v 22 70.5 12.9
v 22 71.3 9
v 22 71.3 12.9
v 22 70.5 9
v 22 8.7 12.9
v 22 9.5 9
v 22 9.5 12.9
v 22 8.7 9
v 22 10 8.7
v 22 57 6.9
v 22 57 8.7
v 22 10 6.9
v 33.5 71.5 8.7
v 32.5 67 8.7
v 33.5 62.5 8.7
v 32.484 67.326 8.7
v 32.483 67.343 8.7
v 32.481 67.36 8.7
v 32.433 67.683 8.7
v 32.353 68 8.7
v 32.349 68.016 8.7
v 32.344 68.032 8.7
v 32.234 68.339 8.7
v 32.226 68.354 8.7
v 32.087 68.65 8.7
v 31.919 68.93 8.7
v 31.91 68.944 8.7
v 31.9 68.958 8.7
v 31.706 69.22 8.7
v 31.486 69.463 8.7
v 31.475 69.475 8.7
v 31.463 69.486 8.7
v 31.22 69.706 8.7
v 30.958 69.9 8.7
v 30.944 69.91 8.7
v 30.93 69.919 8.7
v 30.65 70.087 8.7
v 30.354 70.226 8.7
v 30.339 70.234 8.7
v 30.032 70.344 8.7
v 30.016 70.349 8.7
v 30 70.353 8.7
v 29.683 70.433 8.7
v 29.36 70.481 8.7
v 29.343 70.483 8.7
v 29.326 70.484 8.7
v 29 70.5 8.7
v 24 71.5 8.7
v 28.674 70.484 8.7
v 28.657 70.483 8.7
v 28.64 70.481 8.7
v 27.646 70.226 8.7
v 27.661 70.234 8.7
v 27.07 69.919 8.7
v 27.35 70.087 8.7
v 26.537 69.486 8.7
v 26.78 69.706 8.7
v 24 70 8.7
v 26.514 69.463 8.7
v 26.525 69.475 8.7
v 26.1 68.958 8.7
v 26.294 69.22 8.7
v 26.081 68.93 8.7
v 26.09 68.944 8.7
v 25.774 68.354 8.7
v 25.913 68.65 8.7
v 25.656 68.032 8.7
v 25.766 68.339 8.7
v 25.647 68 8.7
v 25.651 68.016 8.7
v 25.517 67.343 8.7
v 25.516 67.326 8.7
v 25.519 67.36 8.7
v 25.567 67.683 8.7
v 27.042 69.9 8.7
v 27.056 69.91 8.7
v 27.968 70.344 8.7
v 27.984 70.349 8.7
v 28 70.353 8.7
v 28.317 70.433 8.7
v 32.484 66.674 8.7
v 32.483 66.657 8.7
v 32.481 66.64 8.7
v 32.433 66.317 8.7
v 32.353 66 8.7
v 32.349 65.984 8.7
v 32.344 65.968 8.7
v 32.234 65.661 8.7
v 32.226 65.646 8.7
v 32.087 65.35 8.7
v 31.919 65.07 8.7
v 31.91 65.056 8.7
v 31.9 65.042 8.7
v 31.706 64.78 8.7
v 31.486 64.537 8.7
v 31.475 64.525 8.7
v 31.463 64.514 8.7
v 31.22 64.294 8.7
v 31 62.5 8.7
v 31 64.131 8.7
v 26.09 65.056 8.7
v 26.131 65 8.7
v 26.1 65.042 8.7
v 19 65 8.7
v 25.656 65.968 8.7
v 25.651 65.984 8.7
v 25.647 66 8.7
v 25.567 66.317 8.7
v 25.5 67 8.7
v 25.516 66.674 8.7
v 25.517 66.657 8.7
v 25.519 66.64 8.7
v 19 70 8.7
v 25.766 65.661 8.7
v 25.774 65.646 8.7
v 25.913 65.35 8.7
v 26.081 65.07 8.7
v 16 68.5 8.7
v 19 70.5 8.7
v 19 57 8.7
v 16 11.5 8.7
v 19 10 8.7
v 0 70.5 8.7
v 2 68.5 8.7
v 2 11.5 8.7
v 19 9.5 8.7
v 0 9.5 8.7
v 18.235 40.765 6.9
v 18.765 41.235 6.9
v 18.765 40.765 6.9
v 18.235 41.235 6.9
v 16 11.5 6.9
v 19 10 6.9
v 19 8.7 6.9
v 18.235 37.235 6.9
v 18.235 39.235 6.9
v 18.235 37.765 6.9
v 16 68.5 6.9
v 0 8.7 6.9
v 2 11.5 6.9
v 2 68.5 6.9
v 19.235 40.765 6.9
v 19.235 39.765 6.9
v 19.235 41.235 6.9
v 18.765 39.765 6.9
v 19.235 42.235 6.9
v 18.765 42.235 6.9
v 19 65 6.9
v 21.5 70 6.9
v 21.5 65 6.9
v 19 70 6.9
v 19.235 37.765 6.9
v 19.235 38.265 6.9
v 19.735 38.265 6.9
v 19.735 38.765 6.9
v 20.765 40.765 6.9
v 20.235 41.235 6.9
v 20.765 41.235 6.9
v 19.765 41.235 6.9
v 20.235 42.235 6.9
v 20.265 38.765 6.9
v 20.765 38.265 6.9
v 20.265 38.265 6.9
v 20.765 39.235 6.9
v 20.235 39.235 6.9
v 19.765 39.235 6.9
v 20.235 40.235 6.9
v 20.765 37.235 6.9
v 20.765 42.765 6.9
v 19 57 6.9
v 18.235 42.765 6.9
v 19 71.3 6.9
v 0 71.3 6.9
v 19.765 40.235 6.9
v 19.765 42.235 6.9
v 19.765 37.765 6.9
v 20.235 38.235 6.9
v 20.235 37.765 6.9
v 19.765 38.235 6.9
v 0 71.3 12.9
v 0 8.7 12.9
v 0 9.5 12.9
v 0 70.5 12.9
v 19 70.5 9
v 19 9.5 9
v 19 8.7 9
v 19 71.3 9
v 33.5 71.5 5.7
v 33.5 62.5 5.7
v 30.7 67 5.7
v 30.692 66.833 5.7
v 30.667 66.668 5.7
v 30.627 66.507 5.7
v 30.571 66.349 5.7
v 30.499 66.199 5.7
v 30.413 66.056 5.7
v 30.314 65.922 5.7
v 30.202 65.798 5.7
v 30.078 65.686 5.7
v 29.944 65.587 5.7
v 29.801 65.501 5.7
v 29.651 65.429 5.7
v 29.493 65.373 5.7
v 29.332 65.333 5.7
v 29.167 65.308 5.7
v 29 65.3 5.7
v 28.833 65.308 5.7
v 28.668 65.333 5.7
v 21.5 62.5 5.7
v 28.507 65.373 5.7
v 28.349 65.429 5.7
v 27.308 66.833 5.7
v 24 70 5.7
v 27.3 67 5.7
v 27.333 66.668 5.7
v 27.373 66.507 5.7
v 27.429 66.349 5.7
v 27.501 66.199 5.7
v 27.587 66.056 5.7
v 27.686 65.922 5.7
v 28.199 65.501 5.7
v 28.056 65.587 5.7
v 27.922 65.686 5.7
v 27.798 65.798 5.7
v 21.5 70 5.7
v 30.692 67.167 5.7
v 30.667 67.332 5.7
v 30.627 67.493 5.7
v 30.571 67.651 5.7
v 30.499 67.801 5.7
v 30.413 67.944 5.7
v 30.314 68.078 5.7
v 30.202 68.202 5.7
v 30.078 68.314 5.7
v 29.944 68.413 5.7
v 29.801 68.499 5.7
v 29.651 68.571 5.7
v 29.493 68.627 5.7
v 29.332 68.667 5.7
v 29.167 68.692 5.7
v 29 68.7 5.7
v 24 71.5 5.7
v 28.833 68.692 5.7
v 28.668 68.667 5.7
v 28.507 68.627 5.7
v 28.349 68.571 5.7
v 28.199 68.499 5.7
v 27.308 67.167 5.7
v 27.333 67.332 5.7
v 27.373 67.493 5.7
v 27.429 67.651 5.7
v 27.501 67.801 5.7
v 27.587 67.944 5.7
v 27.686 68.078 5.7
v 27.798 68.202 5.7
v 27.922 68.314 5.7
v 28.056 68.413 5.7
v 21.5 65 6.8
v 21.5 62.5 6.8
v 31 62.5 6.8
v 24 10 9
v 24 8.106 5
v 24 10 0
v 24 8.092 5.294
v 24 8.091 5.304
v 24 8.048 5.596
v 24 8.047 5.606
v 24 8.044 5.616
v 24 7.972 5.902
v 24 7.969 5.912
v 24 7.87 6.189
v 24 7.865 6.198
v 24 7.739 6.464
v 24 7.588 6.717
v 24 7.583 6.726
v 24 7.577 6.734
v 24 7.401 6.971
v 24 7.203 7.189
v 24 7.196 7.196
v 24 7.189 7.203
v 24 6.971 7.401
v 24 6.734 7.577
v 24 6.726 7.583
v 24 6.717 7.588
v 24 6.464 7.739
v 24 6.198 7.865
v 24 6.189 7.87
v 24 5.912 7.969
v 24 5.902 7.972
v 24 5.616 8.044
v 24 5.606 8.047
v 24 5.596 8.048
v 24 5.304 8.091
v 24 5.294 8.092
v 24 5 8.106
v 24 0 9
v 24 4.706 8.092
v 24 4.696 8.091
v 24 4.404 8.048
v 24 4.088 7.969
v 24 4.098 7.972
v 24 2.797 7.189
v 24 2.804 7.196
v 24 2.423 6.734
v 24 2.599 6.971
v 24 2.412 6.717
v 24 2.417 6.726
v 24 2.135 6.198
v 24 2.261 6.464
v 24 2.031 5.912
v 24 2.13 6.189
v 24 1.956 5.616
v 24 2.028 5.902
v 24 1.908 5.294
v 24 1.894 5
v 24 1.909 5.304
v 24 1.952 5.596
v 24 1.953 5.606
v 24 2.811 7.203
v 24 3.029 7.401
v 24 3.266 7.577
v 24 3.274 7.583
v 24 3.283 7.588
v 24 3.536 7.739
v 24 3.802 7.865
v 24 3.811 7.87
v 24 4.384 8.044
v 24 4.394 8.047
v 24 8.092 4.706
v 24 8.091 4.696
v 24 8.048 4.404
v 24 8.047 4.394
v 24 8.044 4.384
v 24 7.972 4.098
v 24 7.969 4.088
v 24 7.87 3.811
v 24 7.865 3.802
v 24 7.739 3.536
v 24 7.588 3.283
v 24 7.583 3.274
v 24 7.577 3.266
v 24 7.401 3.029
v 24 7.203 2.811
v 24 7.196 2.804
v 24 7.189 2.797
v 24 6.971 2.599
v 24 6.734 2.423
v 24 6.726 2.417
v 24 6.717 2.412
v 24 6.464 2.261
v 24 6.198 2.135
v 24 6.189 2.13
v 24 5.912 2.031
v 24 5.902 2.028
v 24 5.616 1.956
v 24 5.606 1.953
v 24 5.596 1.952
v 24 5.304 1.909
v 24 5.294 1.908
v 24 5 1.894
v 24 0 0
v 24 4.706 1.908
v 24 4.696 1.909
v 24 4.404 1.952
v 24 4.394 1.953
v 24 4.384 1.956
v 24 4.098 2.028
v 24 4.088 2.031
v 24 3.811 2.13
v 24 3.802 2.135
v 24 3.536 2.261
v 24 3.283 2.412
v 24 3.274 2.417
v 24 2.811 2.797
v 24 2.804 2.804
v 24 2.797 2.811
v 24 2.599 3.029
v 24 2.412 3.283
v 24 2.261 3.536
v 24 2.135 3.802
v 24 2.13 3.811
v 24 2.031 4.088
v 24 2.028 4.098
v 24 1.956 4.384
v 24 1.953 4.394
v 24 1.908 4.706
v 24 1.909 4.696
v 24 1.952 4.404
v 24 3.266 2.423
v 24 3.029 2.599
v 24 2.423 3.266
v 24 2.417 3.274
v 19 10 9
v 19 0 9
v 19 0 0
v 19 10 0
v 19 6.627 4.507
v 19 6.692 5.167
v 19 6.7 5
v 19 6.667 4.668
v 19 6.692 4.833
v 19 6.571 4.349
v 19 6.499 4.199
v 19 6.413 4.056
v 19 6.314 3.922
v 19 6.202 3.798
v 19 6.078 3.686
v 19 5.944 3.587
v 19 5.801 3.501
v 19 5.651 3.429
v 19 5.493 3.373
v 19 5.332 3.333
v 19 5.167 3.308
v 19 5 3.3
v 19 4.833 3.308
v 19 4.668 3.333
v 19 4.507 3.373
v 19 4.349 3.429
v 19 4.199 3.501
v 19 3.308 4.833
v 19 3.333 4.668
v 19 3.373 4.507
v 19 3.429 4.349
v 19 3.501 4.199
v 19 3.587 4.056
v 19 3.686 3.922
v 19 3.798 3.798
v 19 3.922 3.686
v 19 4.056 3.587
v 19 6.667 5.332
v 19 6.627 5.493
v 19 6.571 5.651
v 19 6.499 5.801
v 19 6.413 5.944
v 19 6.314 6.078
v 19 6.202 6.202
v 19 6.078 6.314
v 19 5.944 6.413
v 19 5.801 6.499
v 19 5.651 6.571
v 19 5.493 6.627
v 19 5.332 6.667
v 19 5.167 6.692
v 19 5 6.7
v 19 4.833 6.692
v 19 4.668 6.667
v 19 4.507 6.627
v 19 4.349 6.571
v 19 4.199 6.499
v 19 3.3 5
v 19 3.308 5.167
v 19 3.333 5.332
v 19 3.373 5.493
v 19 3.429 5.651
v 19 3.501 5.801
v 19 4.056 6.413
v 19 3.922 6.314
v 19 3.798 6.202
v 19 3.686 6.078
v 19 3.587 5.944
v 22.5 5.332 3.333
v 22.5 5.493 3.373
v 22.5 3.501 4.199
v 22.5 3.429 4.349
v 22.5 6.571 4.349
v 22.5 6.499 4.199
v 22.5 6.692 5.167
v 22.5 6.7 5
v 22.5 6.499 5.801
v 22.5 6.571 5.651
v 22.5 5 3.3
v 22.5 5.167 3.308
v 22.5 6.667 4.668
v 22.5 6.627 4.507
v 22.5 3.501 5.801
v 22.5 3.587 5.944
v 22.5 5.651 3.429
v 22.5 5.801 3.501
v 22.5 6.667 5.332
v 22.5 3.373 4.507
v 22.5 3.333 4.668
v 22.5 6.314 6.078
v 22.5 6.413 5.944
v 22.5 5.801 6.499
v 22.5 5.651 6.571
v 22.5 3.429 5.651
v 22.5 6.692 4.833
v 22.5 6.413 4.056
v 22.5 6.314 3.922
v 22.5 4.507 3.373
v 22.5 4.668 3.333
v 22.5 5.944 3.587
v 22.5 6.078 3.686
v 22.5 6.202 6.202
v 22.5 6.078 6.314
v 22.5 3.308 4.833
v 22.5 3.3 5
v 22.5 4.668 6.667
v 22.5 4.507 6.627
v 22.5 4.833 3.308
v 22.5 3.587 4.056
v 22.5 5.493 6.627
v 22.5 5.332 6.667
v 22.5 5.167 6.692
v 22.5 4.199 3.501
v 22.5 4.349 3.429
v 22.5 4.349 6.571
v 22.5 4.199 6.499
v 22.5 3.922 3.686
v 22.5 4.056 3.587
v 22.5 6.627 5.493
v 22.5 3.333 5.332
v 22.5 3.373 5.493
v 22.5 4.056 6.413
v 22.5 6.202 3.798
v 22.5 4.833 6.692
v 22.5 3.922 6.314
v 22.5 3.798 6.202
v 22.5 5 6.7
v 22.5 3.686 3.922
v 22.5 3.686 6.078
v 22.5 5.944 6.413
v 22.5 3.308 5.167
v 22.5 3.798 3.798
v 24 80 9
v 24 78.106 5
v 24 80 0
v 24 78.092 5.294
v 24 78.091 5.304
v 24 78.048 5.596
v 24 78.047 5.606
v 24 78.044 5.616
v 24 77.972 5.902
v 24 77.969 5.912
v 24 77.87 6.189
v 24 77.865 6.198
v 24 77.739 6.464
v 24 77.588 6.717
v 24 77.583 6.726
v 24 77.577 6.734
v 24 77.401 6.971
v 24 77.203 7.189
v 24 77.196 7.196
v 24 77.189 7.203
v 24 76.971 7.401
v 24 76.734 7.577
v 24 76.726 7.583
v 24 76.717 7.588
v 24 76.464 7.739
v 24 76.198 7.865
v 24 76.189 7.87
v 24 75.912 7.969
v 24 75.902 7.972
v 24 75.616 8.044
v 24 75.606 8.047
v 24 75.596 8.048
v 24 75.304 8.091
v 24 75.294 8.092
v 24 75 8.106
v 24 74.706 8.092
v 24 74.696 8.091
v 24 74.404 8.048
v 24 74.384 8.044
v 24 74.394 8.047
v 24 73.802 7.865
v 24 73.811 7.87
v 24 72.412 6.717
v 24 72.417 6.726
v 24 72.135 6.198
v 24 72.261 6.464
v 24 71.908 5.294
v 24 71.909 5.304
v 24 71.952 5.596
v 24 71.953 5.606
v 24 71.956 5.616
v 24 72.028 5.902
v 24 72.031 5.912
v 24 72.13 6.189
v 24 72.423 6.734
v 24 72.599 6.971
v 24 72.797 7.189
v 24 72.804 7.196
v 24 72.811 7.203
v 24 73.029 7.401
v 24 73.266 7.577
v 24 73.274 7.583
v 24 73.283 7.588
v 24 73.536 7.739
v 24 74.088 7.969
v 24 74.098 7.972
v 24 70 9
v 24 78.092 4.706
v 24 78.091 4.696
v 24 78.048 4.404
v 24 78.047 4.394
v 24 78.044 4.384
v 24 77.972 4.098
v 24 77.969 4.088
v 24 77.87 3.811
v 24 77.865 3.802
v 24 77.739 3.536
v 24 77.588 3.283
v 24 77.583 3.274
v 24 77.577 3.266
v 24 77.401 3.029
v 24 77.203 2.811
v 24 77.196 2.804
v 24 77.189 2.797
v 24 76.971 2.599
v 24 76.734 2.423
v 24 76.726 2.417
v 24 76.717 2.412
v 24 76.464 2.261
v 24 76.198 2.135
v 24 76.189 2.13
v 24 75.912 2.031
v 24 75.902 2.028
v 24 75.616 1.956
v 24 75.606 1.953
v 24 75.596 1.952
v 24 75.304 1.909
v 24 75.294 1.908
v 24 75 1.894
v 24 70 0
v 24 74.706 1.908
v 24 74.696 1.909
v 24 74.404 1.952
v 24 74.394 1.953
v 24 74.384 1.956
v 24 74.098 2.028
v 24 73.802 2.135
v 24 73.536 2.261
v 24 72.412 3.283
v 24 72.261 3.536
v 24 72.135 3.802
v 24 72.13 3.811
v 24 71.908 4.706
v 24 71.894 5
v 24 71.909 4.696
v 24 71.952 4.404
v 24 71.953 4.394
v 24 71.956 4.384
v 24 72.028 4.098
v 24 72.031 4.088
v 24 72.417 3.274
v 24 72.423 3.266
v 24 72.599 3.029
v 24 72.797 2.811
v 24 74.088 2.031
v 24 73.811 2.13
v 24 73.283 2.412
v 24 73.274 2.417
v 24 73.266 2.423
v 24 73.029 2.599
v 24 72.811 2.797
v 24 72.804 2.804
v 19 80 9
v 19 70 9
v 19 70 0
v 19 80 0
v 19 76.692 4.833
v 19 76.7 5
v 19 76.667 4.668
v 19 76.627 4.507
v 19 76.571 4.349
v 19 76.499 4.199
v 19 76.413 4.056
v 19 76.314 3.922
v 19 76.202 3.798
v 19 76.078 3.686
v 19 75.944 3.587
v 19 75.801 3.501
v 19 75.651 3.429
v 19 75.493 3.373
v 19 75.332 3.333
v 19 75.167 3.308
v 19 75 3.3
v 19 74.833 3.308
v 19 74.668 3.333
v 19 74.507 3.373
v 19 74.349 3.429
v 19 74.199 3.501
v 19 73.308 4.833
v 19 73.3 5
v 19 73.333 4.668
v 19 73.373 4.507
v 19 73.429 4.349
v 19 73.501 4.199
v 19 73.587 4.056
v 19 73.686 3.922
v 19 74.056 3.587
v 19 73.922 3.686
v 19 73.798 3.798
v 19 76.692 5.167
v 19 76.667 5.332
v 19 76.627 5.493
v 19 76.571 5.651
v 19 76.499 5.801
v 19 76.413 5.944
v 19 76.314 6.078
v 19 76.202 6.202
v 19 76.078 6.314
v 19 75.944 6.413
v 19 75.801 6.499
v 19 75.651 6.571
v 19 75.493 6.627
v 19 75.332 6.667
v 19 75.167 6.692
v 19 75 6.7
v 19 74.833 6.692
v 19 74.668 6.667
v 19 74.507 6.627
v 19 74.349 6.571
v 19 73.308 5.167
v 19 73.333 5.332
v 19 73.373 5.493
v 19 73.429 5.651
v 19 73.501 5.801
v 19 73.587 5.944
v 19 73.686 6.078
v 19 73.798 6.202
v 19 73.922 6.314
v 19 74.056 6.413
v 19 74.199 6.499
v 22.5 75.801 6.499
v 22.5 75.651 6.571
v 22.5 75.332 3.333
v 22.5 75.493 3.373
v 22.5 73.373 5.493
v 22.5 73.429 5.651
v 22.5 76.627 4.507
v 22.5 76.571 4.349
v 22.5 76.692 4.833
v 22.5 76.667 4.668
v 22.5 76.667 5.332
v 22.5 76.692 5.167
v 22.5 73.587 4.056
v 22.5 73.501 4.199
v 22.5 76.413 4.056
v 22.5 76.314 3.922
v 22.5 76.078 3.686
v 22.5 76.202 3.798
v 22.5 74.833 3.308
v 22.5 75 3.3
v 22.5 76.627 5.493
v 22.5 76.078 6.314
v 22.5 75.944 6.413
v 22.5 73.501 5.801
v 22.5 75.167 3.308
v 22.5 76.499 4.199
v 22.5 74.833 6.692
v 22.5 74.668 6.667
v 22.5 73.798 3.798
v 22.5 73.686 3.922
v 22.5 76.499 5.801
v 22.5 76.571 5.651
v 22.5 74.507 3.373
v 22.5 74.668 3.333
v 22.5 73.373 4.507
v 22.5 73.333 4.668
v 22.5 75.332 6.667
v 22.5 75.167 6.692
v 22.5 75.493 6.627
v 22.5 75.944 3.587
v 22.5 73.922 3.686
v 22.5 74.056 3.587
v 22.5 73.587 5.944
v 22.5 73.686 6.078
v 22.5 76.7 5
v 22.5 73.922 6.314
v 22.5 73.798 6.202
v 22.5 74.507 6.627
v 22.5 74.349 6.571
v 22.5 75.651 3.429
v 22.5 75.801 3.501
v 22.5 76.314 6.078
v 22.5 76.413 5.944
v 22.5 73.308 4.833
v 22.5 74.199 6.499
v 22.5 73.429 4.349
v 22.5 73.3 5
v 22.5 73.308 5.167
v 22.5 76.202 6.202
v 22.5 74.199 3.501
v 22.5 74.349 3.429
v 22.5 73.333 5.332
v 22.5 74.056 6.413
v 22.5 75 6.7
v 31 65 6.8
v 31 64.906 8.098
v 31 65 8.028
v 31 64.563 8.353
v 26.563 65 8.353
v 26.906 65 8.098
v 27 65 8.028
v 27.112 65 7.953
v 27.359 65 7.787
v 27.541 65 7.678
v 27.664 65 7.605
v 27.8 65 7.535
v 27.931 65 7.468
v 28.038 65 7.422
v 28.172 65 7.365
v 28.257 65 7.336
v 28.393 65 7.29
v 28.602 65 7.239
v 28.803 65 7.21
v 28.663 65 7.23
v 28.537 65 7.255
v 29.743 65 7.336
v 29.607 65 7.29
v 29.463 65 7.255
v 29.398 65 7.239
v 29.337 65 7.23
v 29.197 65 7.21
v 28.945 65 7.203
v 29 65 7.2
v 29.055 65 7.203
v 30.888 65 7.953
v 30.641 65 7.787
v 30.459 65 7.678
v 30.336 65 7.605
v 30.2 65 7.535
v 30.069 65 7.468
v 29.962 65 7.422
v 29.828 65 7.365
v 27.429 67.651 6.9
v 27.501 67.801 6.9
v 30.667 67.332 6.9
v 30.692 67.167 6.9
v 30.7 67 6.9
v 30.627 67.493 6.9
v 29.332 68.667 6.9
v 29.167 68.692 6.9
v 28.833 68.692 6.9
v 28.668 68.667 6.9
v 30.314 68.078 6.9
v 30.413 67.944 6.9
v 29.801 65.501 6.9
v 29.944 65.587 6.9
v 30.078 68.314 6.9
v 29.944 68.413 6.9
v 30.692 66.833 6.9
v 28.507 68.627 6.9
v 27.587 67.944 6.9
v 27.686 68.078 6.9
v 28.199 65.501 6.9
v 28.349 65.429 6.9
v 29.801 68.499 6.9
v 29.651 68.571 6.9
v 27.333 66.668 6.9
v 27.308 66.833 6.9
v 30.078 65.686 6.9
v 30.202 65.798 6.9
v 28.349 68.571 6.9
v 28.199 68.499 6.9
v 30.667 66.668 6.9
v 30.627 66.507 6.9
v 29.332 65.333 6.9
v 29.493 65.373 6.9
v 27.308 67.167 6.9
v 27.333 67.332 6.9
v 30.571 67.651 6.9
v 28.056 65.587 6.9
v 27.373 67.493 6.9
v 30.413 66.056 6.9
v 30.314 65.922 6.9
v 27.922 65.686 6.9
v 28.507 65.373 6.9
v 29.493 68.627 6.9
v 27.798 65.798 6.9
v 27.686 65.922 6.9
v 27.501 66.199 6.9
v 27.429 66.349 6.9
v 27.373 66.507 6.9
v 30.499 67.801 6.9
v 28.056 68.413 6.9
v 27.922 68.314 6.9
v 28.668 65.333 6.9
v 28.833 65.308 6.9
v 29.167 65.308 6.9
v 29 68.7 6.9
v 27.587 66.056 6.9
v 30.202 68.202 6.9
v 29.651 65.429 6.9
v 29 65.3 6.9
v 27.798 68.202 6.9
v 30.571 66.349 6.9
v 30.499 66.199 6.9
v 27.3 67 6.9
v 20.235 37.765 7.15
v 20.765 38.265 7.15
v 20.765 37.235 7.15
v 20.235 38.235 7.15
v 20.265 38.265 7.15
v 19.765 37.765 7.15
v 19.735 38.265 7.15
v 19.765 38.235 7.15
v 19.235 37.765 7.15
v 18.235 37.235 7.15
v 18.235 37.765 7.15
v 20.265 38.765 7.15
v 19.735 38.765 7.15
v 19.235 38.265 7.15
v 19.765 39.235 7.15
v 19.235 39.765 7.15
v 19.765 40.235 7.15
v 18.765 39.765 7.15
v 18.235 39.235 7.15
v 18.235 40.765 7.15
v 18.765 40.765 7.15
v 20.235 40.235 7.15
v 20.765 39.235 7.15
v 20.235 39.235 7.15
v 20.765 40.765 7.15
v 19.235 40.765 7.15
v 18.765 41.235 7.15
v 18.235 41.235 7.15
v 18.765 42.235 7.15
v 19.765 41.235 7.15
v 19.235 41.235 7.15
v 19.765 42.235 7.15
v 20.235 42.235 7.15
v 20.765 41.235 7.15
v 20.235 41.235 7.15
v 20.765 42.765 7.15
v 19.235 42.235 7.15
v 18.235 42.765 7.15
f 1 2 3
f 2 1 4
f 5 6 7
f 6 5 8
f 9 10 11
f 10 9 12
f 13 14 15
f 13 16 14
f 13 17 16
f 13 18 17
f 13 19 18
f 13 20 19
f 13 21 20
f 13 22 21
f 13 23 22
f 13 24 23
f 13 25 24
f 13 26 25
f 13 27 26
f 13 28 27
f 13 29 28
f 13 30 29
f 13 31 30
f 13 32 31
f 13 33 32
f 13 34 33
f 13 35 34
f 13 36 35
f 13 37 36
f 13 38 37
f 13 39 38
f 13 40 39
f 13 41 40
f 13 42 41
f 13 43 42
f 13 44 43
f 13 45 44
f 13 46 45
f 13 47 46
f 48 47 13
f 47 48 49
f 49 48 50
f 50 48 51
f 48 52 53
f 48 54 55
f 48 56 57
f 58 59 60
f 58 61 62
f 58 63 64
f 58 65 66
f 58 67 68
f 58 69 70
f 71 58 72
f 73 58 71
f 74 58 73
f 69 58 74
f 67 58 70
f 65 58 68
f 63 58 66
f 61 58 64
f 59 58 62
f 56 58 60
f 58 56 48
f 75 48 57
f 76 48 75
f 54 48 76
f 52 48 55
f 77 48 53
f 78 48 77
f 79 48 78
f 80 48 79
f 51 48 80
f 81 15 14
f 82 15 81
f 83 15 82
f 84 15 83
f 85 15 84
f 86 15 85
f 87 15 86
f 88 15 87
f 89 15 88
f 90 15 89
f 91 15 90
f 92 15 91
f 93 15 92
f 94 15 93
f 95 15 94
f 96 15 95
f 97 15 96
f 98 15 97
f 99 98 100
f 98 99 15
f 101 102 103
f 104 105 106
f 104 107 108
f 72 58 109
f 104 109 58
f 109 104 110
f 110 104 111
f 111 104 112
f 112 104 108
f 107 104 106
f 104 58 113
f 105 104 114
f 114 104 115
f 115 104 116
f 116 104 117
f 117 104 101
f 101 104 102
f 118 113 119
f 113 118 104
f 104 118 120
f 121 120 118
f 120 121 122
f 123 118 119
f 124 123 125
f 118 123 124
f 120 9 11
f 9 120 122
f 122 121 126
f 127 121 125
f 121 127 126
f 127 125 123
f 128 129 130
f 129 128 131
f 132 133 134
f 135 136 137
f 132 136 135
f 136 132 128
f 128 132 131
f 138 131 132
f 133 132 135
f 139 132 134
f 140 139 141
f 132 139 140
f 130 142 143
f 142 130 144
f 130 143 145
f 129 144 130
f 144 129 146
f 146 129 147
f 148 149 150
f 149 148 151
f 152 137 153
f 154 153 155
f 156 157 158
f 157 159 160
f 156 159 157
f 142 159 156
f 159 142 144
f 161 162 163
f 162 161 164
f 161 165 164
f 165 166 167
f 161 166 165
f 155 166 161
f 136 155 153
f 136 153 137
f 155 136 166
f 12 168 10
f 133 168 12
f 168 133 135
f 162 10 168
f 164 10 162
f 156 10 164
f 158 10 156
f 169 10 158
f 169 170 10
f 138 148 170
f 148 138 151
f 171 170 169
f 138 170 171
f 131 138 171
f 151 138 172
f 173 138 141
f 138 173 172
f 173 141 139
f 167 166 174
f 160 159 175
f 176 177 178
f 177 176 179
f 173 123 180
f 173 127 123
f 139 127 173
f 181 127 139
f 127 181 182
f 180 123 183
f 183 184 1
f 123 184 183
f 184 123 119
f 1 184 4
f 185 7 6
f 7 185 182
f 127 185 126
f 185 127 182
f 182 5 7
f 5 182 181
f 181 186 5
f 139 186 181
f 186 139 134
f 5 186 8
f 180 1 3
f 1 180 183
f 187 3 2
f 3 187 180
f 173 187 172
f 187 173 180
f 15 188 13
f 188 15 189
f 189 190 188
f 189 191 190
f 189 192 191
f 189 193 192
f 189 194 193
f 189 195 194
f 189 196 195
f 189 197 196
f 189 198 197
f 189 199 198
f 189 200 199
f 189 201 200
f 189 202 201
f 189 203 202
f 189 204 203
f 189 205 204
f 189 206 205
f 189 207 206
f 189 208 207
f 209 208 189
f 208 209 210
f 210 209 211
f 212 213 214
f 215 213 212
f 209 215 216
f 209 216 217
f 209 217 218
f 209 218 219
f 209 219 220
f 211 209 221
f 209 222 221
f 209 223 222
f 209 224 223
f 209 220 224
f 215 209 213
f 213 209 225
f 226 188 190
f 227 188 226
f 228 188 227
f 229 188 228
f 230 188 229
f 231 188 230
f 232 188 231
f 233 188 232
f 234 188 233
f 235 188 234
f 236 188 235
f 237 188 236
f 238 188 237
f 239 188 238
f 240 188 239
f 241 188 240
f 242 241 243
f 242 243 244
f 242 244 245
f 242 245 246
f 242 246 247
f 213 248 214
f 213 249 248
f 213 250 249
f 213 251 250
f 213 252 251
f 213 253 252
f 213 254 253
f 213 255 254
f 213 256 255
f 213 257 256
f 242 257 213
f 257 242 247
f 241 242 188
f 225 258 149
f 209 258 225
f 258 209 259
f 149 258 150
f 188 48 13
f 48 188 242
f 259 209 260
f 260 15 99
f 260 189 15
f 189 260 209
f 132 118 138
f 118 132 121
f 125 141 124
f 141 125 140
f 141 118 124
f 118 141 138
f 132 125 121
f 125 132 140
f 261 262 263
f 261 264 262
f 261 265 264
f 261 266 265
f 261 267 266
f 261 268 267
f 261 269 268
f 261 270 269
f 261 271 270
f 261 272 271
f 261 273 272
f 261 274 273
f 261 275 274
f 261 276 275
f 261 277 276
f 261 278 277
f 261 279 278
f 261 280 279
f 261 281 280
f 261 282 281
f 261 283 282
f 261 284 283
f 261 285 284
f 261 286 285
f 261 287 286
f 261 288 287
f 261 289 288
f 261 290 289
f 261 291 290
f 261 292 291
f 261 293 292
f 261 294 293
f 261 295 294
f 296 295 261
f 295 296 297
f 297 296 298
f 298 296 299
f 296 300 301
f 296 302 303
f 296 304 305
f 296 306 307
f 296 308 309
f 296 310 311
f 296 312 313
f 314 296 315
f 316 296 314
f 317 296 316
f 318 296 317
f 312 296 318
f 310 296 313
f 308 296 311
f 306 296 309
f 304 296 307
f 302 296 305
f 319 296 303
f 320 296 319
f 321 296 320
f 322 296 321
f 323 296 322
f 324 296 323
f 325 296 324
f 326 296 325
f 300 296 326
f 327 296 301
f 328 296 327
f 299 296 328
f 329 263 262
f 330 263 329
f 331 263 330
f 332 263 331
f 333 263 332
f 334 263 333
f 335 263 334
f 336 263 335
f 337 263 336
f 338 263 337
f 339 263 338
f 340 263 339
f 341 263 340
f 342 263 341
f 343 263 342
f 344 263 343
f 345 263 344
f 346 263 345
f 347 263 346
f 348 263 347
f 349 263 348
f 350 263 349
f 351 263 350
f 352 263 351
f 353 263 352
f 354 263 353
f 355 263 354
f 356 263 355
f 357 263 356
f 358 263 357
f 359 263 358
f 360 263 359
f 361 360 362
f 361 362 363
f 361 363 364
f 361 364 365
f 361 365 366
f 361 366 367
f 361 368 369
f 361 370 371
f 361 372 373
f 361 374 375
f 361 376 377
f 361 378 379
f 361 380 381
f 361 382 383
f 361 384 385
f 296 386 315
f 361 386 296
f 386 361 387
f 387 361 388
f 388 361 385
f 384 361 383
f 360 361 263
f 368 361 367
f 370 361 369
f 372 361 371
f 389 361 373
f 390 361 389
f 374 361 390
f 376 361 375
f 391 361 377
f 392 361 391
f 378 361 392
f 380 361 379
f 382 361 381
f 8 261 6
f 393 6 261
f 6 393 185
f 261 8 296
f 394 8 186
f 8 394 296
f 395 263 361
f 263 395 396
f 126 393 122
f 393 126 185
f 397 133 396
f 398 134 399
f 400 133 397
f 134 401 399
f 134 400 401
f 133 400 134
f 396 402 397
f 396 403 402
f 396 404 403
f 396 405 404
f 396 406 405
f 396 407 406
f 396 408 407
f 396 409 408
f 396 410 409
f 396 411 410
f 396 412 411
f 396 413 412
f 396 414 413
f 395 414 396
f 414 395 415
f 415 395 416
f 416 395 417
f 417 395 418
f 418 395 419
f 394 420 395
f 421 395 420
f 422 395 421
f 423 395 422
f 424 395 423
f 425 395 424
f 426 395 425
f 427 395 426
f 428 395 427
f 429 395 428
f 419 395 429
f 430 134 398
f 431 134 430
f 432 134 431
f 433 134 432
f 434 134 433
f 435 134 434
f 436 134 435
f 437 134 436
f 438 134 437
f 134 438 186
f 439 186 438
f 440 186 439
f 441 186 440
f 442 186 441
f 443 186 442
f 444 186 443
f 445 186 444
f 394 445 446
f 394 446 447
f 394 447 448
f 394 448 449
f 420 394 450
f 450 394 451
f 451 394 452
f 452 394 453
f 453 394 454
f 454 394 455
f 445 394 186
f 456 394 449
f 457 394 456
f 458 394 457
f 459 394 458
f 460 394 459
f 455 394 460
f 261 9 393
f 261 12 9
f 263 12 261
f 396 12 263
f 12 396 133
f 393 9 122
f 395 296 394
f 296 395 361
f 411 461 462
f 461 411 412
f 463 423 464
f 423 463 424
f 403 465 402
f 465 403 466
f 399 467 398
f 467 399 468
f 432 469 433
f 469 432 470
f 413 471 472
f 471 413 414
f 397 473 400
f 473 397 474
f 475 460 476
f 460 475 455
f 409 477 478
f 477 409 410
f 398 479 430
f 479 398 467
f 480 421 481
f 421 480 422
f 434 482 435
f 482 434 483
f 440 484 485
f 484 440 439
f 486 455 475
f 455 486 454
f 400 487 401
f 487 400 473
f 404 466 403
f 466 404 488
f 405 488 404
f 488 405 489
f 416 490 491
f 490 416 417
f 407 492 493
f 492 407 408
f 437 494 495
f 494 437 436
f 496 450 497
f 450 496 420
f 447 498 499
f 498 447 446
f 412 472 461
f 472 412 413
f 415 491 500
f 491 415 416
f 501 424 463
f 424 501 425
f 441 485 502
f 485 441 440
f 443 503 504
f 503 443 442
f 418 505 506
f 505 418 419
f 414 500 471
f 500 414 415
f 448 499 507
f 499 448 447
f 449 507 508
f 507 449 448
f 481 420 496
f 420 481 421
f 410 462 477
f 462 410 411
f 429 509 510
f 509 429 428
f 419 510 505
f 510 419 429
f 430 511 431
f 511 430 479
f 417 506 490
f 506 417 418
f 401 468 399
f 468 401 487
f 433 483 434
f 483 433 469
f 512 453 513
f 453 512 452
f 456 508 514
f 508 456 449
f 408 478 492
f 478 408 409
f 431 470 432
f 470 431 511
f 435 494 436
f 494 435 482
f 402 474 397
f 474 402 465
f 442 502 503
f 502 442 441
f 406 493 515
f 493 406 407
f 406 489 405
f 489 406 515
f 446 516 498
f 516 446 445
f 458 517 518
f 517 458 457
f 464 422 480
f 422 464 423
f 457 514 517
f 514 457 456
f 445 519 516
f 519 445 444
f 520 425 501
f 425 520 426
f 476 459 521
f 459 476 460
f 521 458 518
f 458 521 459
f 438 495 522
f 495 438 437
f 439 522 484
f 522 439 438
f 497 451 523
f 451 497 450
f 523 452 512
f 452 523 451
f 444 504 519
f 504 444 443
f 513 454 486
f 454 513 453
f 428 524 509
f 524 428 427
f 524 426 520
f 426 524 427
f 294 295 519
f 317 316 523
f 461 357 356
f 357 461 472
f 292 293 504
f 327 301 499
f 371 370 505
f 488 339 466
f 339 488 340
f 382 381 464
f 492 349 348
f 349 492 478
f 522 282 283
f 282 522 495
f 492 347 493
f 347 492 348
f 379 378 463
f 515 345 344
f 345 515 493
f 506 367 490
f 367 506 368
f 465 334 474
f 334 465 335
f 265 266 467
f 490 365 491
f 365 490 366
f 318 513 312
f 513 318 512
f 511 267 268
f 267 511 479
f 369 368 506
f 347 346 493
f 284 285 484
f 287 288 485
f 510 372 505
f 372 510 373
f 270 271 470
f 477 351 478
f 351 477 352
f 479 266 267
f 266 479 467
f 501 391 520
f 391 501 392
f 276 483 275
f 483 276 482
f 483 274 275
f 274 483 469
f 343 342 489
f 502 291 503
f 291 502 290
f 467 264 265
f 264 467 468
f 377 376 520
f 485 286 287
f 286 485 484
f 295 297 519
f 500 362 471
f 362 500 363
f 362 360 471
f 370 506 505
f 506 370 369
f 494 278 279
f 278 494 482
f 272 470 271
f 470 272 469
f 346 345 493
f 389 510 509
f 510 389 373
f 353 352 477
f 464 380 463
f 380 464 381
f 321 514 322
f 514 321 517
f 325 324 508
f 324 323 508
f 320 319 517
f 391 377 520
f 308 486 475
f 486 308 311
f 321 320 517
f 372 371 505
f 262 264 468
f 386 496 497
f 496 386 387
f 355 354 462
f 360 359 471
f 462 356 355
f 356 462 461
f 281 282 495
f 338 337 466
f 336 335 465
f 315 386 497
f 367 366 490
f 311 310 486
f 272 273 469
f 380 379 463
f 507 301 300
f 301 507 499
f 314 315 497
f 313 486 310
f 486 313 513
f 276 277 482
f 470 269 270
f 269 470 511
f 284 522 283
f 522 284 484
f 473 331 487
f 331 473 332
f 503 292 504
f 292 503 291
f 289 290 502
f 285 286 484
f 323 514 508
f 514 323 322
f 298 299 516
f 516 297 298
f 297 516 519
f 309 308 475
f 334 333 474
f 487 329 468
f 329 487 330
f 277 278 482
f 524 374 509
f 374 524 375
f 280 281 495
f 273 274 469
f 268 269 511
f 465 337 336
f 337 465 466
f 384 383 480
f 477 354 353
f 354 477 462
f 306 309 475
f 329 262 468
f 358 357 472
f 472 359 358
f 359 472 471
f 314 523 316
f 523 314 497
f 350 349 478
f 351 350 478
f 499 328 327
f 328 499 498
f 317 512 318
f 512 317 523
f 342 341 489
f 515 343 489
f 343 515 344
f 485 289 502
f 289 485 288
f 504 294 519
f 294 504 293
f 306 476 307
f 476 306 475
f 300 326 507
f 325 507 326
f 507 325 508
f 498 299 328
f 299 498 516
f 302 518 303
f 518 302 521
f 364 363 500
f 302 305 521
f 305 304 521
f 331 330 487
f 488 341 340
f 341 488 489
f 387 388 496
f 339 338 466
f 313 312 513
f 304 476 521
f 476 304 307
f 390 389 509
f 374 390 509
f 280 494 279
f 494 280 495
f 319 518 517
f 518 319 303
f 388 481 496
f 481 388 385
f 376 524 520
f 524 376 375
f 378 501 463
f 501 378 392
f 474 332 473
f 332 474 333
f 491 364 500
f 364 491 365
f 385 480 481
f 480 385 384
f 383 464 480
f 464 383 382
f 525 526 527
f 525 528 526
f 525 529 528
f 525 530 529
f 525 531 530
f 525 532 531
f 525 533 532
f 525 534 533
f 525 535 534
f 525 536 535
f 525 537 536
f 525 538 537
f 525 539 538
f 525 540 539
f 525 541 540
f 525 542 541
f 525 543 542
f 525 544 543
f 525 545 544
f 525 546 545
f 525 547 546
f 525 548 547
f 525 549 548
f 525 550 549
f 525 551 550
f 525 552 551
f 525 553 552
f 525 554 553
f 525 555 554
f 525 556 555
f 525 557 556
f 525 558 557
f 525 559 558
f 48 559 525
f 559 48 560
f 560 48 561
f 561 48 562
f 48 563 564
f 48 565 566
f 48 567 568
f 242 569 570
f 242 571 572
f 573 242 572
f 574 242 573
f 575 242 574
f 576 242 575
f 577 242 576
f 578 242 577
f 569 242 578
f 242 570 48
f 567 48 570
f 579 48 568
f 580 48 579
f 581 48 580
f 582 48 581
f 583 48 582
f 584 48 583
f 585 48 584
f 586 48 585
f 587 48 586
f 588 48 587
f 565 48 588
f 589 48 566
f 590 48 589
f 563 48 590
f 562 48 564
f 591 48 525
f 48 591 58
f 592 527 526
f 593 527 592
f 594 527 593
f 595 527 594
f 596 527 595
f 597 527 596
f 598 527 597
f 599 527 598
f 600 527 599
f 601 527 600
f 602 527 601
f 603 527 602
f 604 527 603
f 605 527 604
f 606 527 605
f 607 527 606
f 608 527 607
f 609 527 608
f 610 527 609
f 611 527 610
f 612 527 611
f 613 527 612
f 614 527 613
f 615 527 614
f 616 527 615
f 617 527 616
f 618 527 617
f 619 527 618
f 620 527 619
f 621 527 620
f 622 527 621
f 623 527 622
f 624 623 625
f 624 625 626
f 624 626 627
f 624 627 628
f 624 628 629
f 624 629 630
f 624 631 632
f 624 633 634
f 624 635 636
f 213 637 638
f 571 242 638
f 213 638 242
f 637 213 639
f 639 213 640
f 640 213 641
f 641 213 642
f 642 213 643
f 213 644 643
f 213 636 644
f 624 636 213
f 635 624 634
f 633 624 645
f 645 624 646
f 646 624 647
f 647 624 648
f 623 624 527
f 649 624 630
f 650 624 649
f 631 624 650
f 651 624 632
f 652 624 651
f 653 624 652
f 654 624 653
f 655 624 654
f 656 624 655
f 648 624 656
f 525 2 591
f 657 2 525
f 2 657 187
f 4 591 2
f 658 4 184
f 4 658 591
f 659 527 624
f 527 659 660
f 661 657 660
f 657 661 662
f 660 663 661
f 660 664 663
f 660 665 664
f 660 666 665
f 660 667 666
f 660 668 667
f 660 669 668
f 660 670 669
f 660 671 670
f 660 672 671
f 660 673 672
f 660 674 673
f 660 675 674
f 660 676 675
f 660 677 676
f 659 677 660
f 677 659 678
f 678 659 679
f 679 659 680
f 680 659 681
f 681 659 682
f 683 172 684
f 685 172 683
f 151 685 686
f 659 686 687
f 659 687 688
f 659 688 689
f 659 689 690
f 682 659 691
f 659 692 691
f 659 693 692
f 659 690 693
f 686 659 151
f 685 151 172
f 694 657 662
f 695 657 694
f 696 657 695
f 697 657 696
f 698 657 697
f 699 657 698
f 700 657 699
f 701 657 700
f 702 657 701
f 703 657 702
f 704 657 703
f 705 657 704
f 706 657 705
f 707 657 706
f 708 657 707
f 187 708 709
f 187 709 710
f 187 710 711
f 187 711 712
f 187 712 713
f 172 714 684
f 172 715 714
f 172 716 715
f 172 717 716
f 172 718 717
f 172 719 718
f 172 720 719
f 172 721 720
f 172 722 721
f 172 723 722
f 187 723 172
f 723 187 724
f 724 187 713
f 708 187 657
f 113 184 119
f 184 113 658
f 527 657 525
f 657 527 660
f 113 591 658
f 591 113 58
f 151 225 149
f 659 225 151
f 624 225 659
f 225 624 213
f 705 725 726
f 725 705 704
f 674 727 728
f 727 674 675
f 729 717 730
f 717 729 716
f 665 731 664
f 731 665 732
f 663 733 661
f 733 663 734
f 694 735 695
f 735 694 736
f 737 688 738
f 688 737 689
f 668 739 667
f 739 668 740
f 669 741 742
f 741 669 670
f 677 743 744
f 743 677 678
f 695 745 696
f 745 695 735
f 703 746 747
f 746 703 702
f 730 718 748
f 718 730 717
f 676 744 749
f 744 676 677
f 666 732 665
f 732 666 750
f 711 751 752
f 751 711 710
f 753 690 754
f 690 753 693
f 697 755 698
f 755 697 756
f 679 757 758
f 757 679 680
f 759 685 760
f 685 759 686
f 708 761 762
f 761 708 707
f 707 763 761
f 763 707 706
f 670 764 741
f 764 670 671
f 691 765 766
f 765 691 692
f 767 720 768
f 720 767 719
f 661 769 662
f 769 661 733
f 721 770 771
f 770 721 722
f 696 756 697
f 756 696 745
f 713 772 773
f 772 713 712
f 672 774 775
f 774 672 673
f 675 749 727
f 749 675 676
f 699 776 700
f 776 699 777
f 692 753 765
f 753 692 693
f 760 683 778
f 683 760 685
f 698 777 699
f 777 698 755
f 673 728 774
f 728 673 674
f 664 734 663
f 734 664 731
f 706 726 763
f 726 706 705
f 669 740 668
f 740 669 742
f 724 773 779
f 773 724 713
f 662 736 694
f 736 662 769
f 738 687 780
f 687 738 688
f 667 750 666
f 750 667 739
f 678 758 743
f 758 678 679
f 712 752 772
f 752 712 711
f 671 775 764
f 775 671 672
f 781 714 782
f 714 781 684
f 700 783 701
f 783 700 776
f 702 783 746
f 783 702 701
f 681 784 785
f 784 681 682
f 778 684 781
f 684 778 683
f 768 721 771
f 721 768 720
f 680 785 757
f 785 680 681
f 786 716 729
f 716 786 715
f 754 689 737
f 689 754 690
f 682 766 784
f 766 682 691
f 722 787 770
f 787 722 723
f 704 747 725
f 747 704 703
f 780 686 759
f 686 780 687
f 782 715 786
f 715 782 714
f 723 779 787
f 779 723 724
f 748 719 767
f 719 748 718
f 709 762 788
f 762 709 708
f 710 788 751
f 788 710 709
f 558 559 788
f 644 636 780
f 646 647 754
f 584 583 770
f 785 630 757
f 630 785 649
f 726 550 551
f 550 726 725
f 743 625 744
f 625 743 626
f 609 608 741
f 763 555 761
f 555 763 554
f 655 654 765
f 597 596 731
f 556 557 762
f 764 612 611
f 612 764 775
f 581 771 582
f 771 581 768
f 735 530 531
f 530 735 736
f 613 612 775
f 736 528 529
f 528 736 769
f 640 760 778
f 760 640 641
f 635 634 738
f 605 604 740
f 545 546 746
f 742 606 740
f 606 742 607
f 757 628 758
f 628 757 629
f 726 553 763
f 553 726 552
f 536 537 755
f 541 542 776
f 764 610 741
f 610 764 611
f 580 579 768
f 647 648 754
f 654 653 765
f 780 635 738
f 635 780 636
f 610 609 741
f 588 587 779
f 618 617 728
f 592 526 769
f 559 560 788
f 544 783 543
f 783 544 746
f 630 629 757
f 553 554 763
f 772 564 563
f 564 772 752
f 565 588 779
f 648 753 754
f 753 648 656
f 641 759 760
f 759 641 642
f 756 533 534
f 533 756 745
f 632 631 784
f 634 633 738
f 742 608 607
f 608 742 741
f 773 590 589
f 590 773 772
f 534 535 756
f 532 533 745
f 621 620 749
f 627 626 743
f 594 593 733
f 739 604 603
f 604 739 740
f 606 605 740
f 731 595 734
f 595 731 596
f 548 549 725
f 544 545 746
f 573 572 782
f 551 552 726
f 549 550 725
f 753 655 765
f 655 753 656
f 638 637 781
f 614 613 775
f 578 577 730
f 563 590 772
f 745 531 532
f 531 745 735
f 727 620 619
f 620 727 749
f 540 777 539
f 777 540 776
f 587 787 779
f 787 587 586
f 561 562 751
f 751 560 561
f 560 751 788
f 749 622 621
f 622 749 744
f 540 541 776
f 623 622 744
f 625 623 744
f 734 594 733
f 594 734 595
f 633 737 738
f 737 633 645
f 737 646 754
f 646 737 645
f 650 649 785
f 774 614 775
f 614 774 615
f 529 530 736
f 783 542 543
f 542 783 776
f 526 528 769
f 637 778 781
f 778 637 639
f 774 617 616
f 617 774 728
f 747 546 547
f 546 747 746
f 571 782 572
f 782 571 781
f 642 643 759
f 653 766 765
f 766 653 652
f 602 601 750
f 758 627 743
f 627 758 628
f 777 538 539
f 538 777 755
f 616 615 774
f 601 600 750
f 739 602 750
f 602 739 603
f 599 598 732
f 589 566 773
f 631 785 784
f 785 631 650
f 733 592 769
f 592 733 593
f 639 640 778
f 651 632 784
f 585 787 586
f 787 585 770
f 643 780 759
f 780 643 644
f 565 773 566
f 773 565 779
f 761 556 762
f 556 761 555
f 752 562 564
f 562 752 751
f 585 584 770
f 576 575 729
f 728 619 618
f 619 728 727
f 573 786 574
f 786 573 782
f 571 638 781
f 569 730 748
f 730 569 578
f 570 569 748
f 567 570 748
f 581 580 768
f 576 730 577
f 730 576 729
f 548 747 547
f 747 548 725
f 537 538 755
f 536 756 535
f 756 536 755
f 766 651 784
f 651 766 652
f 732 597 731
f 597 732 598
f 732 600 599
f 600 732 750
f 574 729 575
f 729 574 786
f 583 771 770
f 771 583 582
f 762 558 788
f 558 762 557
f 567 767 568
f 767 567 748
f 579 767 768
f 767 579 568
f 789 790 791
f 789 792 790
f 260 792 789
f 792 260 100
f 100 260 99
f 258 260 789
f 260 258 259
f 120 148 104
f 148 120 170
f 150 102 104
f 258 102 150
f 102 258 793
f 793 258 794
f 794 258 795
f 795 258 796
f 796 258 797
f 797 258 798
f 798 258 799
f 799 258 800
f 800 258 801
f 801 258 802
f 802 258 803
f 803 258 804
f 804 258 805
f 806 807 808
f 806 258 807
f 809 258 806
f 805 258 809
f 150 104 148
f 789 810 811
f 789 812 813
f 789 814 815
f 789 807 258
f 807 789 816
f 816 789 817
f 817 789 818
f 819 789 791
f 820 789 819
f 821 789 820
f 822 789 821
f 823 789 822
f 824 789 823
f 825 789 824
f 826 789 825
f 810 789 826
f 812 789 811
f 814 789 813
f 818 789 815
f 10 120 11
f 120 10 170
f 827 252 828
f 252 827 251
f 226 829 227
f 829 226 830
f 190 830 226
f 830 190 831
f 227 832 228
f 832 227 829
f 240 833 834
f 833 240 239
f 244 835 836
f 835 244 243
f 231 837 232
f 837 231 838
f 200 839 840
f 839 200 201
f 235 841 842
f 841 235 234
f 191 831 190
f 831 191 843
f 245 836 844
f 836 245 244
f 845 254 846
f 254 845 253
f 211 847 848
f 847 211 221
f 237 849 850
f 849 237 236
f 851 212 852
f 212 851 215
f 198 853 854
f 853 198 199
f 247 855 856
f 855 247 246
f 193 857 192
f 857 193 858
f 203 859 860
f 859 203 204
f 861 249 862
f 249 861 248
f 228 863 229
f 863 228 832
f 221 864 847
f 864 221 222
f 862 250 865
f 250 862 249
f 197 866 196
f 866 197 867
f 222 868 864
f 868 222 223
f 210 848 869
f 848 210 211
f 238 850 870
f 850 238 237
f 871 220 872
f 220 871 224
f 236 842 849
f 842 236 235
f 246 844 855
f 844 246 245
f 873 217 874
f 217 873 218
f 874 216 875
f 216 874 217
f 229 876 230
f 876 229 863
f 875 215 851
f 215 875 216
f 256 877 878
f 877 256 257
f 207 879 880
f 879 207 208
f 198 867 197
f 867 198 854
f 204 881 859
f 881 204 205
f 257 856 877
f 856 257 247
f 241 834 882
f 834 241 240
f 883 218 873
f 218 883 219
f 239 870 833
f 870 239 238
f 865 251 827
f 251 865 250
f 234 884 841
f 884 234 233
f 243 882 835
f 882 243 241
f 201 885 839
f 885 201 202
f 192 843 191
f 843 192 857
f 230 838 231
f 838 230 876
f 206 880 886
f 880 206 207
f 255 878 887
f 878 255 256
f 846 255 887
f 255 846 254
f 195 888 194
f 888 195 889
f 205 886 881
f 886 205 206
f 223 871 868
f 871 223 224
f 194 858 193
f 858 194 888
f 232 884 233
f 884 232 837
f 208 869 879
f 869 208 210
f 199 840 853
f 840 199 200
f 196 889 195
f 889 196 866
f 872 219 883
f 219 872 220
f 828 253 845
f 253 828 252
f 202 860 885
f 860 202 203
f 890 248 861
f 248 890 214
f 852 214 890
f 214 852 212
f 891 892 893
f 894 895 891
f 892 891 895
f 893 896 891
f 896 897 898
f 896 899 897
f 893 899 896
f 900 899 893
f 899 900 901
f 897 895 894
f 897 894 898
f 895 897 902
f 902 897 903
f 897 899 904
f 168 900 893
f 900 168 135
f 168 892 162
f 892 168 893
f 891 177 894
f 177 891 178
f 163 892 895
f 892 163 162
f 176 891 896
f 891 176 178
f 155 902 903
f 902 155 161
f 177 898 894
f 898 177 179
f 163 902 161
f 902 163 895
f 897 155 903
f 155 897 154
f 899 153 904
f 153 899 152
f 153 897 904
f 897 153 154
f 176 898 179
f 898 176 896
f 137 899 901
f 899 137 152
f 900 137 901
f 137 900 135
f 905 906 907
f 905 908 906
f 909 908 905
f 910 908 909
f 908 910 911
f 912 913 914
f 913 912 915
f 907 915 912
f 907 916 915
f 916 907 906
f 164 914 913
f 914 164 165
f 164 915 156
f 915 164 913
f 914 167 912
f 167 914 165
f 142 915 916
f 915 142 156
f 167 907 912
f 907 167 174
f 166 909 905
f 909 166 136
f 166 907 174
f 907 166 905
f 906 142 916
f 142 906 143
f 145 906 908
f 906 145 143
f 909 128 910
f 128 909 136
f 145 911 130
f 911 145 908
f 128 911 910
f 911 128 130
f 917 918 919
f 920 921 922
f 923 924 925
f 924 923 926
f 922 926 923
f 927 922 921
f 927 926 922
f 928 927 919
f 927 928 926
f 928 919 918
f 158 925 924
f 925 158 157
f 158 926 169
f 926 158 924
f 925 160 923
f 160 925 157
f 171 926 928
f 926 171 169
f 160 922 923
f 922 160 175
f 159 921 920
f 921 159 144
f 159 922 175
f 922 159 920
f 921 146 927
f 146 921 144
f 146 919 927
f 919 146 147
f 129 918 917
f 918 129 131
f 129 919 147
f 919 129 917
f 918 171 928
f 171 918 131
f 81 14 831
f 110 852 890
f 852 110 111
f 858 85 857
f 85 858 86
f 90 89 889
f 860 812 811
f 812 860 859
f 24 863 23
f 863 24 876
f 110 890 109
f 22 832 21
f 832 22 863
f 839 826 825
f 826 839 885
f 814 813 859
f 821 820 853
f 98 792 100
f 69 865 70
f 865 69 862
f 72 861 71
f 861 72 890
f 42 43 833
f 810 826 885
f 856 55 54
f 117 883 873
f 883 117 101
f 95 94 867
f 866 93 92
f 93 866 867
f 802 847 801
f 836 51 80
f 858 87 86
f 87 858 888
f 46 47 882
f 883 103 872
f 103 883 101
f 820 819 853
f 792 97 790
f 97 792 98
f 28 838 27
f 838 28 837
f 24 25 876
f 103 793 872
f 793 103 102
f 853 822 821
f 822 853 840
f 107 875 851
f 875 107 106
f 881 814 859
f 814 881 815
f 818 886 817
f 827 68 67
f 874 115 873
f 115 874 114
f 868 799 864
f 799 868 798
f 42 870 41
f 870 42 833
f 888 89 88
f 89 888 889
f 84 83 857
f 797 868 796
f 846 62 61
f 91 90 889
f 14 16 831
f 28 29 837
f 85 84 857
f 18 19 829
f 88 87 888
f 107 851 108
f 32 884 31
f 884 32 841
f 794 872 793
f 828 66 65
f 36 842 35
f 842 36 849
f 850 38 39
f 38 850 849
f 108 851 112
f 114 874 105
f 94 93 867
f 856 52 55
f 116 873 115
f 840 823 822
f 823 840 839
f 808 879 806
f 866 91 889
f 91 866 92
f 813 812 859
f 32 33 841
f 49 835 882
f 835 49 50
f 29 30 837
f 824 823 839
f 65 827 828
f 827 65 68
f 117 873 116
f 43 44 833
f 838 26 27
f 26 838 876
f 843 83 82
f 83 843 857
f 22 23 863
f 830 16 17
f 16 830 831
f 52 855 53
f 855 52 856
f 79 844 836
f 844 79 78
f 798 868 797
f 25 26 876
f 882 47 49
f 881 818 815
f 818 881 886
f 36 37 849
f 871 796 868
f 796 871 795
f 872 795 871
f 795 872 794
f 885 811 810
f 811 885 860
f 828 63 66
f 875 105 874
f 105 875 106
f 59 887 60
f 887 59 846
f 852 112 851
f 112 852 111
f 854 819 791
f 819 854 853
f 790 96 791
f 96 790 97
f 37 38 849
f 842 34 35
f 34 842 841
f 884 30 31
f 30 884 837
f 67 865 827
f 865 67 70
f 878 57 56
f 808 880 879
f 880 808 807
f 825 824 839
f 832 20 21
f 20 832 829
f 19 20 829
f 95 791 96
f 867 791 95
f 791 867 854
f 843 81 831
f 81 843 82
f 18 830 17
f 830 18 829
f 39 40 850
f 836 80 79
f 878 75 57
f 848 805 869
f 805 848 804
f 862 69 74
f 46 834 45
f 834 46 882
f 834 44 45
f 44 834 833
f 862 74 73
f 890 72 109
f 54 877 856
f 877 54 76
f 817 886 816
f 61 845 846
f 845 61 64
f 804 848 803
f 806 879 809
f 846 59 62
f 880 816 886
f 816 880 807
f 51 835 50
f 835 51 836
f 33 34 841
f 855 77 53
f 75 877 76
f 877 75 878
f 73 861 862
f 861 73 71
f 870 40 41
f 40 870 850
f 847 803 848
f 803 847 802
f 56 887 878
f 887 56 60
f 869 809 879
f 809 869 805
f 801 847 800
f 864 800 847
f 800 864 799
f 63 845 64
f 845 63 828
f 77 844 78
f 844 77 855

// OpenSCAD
// 出牌導向槽
$fn=64;
translate([-52,40,-55]){rotate([0,0,0]){difference(){difference(){difference(){difference(){difference(){difference(){difference(){union(){difference(){difference(){union(){difference(){union(){union(){union(){translate([52,-30.5,61.9]){cube([22,61,1.8]);}translate([52,-31.3,61.9]){cube([22,0.8,6]);}}translate([52,30.5,61.9]){cube([22,0.8,6]);}}translate([73.5,22.5,60.7]){cube([12,9,3]);}}translate([54,-28.5,61]){cube([14,57,4]);}}translate([71,-40,55]){cube([5,10,9]);}}translate([69,-35,60]){rotate([0,90,0]){translate([0,0,0]){cylinder(h=9,d1=3.4,d2=3.4,$fn=64);}}}}translate([76.1,-35,60]){rotate([0,-90,0]){translate([0,0,0]){cylinder(h=1.6,d1=6.4,d2=3.4,$fn=64);}}}}translate([71,30,55]){cube([5,10,9]);}}translate([69,35,60]){rotate([0,90,0]){translate([0,0,0]){cylinder(h=9,d1=3.4,d2=3.4,$fn=64);}}}}translate([76.1,35,60]){rotate([0,-90,0]){translate([0,0,0]){cylinder(h=1.6,d1=6.4,d2=3.4,$fn=64);}}}}translate([71,17,61.8]){cube([12,8,8]);}}translate([81,27,59]){cylinder(h=10,d1=3.4,d2=3.4,$fn=64);}}translate([81,27,63.8]){rotate([180,0,0]){translate([0,0,0]){cylinder(h=1.7,d1=6.4,d2=3.4,$fn=64);}}}}multmatrix([[0,1,0,71.5],[1,0,0,0],[0,0,-1,61.9],[0,0,0,1]]){union(){union(){union(){union(){union(){union(){union(){union(){union(){union(){union(){union(){union(){union(){union(){union(){union(){union(){union(){union(){union(){union(){union(){union(){union(){union(){union(){union(){union(){translate([-2.765,0.735,-0.25]){cube([0.53,0.53,0.37]);}translate([-2.265,0.735,-0.25]){cube([0.53,0.53,0.37]);}}translate([-2.765,0.235,-0.25]){cube([0.53,0.53,0.37]);}}translate([-1.765,0.235,-0.25]){cube([0.53,0.53,0.37]);}}translate([-2.765,-0.265,-0.25]){cube([0.53,0.53,0.37]);}}translate([-2.265,-0.265,-0.25]){cube([0.53,0.53,0.37]);}}translate([-2.765,-0.765,-0.25]){cube([0.53,0.53,0.37]);}}translate([-2.765,-1.265,-0.25]){cube([0.53,0.53,0.37]);}}translate([-0.765,0.735,-0.25]){cube([0.53,0.53,0.37]);}}translate([-0.265,0.735,-0.25]){cube([0.53,0.53,0.37]);}}translate([0.235,0.735,-0.25]){cube([0.53,0.53,0.37]);}}translate([0.235,0.235,-0.25]){cube([0.53,0.53,0.37]);}}translate([-0.765,-0.265,-0.25]){cube([0.53,0.53,0.37]);}}translate([-0.265,-0.265,-0.25]){cube([0.53,0.53,0.37]);}}translate([0.235,-0.265,-0.25]){cube([0.53,0.53,0.37]);}}translate([-0.765,-0.765,-0.25]){cube([0.53,0.53,0.37]);}}translate([-0.765,-1.265,-0.25]){cube([0.53,0.53,0.37]);}}translate([-0.265,-1.265,-0.25]){cube([0.53,0.53,0.37]);}}translate([0.235,-1.265,-0.25]){cube([0.53,0.53,0.37]);}}translate([1.235,0.735,-0.25]){cube([0.53,0.53,0.37]);}}translate([1.735,0.735,-0.25]){cube([0.53,0.53,0.37]);}}translate([2.235,0.735,-0.25]){cube([0.53,0.53,0.37]);}}translate([2.235,0.235,-0.25]){cube([0.53,0.53,0.37]);}}translate([1.235,-0.265,-0.25]){cube([0.53,0.53,0.37]);}}translate([1.735,-0.265,-0.25]){cube([0.53,0.53,0.37]);}}translate([2.235,-0.265,-0.25]){cube([0.53,0.53,0.37]);}}translate([2.235,-0.765,-0.25]){cube([0.53,0.53,0.37]);}}translate([1.235,-1.265,-0.25]){cube([0.53,0.53,0.37]);}}translate([1.735,-1.265,-0.25]){cube([0.53,0.53,0.37]);}}translate([2.235,-1.265,-0.25]){cube([0.53,0.53,0.37]);}}}}translate([81,27,63.9]){rotate([180,0,0]){translate([0,0,0]){cylinder(h=2,d1=7.4,d2=3.4,$fn=64);}}}}}}
